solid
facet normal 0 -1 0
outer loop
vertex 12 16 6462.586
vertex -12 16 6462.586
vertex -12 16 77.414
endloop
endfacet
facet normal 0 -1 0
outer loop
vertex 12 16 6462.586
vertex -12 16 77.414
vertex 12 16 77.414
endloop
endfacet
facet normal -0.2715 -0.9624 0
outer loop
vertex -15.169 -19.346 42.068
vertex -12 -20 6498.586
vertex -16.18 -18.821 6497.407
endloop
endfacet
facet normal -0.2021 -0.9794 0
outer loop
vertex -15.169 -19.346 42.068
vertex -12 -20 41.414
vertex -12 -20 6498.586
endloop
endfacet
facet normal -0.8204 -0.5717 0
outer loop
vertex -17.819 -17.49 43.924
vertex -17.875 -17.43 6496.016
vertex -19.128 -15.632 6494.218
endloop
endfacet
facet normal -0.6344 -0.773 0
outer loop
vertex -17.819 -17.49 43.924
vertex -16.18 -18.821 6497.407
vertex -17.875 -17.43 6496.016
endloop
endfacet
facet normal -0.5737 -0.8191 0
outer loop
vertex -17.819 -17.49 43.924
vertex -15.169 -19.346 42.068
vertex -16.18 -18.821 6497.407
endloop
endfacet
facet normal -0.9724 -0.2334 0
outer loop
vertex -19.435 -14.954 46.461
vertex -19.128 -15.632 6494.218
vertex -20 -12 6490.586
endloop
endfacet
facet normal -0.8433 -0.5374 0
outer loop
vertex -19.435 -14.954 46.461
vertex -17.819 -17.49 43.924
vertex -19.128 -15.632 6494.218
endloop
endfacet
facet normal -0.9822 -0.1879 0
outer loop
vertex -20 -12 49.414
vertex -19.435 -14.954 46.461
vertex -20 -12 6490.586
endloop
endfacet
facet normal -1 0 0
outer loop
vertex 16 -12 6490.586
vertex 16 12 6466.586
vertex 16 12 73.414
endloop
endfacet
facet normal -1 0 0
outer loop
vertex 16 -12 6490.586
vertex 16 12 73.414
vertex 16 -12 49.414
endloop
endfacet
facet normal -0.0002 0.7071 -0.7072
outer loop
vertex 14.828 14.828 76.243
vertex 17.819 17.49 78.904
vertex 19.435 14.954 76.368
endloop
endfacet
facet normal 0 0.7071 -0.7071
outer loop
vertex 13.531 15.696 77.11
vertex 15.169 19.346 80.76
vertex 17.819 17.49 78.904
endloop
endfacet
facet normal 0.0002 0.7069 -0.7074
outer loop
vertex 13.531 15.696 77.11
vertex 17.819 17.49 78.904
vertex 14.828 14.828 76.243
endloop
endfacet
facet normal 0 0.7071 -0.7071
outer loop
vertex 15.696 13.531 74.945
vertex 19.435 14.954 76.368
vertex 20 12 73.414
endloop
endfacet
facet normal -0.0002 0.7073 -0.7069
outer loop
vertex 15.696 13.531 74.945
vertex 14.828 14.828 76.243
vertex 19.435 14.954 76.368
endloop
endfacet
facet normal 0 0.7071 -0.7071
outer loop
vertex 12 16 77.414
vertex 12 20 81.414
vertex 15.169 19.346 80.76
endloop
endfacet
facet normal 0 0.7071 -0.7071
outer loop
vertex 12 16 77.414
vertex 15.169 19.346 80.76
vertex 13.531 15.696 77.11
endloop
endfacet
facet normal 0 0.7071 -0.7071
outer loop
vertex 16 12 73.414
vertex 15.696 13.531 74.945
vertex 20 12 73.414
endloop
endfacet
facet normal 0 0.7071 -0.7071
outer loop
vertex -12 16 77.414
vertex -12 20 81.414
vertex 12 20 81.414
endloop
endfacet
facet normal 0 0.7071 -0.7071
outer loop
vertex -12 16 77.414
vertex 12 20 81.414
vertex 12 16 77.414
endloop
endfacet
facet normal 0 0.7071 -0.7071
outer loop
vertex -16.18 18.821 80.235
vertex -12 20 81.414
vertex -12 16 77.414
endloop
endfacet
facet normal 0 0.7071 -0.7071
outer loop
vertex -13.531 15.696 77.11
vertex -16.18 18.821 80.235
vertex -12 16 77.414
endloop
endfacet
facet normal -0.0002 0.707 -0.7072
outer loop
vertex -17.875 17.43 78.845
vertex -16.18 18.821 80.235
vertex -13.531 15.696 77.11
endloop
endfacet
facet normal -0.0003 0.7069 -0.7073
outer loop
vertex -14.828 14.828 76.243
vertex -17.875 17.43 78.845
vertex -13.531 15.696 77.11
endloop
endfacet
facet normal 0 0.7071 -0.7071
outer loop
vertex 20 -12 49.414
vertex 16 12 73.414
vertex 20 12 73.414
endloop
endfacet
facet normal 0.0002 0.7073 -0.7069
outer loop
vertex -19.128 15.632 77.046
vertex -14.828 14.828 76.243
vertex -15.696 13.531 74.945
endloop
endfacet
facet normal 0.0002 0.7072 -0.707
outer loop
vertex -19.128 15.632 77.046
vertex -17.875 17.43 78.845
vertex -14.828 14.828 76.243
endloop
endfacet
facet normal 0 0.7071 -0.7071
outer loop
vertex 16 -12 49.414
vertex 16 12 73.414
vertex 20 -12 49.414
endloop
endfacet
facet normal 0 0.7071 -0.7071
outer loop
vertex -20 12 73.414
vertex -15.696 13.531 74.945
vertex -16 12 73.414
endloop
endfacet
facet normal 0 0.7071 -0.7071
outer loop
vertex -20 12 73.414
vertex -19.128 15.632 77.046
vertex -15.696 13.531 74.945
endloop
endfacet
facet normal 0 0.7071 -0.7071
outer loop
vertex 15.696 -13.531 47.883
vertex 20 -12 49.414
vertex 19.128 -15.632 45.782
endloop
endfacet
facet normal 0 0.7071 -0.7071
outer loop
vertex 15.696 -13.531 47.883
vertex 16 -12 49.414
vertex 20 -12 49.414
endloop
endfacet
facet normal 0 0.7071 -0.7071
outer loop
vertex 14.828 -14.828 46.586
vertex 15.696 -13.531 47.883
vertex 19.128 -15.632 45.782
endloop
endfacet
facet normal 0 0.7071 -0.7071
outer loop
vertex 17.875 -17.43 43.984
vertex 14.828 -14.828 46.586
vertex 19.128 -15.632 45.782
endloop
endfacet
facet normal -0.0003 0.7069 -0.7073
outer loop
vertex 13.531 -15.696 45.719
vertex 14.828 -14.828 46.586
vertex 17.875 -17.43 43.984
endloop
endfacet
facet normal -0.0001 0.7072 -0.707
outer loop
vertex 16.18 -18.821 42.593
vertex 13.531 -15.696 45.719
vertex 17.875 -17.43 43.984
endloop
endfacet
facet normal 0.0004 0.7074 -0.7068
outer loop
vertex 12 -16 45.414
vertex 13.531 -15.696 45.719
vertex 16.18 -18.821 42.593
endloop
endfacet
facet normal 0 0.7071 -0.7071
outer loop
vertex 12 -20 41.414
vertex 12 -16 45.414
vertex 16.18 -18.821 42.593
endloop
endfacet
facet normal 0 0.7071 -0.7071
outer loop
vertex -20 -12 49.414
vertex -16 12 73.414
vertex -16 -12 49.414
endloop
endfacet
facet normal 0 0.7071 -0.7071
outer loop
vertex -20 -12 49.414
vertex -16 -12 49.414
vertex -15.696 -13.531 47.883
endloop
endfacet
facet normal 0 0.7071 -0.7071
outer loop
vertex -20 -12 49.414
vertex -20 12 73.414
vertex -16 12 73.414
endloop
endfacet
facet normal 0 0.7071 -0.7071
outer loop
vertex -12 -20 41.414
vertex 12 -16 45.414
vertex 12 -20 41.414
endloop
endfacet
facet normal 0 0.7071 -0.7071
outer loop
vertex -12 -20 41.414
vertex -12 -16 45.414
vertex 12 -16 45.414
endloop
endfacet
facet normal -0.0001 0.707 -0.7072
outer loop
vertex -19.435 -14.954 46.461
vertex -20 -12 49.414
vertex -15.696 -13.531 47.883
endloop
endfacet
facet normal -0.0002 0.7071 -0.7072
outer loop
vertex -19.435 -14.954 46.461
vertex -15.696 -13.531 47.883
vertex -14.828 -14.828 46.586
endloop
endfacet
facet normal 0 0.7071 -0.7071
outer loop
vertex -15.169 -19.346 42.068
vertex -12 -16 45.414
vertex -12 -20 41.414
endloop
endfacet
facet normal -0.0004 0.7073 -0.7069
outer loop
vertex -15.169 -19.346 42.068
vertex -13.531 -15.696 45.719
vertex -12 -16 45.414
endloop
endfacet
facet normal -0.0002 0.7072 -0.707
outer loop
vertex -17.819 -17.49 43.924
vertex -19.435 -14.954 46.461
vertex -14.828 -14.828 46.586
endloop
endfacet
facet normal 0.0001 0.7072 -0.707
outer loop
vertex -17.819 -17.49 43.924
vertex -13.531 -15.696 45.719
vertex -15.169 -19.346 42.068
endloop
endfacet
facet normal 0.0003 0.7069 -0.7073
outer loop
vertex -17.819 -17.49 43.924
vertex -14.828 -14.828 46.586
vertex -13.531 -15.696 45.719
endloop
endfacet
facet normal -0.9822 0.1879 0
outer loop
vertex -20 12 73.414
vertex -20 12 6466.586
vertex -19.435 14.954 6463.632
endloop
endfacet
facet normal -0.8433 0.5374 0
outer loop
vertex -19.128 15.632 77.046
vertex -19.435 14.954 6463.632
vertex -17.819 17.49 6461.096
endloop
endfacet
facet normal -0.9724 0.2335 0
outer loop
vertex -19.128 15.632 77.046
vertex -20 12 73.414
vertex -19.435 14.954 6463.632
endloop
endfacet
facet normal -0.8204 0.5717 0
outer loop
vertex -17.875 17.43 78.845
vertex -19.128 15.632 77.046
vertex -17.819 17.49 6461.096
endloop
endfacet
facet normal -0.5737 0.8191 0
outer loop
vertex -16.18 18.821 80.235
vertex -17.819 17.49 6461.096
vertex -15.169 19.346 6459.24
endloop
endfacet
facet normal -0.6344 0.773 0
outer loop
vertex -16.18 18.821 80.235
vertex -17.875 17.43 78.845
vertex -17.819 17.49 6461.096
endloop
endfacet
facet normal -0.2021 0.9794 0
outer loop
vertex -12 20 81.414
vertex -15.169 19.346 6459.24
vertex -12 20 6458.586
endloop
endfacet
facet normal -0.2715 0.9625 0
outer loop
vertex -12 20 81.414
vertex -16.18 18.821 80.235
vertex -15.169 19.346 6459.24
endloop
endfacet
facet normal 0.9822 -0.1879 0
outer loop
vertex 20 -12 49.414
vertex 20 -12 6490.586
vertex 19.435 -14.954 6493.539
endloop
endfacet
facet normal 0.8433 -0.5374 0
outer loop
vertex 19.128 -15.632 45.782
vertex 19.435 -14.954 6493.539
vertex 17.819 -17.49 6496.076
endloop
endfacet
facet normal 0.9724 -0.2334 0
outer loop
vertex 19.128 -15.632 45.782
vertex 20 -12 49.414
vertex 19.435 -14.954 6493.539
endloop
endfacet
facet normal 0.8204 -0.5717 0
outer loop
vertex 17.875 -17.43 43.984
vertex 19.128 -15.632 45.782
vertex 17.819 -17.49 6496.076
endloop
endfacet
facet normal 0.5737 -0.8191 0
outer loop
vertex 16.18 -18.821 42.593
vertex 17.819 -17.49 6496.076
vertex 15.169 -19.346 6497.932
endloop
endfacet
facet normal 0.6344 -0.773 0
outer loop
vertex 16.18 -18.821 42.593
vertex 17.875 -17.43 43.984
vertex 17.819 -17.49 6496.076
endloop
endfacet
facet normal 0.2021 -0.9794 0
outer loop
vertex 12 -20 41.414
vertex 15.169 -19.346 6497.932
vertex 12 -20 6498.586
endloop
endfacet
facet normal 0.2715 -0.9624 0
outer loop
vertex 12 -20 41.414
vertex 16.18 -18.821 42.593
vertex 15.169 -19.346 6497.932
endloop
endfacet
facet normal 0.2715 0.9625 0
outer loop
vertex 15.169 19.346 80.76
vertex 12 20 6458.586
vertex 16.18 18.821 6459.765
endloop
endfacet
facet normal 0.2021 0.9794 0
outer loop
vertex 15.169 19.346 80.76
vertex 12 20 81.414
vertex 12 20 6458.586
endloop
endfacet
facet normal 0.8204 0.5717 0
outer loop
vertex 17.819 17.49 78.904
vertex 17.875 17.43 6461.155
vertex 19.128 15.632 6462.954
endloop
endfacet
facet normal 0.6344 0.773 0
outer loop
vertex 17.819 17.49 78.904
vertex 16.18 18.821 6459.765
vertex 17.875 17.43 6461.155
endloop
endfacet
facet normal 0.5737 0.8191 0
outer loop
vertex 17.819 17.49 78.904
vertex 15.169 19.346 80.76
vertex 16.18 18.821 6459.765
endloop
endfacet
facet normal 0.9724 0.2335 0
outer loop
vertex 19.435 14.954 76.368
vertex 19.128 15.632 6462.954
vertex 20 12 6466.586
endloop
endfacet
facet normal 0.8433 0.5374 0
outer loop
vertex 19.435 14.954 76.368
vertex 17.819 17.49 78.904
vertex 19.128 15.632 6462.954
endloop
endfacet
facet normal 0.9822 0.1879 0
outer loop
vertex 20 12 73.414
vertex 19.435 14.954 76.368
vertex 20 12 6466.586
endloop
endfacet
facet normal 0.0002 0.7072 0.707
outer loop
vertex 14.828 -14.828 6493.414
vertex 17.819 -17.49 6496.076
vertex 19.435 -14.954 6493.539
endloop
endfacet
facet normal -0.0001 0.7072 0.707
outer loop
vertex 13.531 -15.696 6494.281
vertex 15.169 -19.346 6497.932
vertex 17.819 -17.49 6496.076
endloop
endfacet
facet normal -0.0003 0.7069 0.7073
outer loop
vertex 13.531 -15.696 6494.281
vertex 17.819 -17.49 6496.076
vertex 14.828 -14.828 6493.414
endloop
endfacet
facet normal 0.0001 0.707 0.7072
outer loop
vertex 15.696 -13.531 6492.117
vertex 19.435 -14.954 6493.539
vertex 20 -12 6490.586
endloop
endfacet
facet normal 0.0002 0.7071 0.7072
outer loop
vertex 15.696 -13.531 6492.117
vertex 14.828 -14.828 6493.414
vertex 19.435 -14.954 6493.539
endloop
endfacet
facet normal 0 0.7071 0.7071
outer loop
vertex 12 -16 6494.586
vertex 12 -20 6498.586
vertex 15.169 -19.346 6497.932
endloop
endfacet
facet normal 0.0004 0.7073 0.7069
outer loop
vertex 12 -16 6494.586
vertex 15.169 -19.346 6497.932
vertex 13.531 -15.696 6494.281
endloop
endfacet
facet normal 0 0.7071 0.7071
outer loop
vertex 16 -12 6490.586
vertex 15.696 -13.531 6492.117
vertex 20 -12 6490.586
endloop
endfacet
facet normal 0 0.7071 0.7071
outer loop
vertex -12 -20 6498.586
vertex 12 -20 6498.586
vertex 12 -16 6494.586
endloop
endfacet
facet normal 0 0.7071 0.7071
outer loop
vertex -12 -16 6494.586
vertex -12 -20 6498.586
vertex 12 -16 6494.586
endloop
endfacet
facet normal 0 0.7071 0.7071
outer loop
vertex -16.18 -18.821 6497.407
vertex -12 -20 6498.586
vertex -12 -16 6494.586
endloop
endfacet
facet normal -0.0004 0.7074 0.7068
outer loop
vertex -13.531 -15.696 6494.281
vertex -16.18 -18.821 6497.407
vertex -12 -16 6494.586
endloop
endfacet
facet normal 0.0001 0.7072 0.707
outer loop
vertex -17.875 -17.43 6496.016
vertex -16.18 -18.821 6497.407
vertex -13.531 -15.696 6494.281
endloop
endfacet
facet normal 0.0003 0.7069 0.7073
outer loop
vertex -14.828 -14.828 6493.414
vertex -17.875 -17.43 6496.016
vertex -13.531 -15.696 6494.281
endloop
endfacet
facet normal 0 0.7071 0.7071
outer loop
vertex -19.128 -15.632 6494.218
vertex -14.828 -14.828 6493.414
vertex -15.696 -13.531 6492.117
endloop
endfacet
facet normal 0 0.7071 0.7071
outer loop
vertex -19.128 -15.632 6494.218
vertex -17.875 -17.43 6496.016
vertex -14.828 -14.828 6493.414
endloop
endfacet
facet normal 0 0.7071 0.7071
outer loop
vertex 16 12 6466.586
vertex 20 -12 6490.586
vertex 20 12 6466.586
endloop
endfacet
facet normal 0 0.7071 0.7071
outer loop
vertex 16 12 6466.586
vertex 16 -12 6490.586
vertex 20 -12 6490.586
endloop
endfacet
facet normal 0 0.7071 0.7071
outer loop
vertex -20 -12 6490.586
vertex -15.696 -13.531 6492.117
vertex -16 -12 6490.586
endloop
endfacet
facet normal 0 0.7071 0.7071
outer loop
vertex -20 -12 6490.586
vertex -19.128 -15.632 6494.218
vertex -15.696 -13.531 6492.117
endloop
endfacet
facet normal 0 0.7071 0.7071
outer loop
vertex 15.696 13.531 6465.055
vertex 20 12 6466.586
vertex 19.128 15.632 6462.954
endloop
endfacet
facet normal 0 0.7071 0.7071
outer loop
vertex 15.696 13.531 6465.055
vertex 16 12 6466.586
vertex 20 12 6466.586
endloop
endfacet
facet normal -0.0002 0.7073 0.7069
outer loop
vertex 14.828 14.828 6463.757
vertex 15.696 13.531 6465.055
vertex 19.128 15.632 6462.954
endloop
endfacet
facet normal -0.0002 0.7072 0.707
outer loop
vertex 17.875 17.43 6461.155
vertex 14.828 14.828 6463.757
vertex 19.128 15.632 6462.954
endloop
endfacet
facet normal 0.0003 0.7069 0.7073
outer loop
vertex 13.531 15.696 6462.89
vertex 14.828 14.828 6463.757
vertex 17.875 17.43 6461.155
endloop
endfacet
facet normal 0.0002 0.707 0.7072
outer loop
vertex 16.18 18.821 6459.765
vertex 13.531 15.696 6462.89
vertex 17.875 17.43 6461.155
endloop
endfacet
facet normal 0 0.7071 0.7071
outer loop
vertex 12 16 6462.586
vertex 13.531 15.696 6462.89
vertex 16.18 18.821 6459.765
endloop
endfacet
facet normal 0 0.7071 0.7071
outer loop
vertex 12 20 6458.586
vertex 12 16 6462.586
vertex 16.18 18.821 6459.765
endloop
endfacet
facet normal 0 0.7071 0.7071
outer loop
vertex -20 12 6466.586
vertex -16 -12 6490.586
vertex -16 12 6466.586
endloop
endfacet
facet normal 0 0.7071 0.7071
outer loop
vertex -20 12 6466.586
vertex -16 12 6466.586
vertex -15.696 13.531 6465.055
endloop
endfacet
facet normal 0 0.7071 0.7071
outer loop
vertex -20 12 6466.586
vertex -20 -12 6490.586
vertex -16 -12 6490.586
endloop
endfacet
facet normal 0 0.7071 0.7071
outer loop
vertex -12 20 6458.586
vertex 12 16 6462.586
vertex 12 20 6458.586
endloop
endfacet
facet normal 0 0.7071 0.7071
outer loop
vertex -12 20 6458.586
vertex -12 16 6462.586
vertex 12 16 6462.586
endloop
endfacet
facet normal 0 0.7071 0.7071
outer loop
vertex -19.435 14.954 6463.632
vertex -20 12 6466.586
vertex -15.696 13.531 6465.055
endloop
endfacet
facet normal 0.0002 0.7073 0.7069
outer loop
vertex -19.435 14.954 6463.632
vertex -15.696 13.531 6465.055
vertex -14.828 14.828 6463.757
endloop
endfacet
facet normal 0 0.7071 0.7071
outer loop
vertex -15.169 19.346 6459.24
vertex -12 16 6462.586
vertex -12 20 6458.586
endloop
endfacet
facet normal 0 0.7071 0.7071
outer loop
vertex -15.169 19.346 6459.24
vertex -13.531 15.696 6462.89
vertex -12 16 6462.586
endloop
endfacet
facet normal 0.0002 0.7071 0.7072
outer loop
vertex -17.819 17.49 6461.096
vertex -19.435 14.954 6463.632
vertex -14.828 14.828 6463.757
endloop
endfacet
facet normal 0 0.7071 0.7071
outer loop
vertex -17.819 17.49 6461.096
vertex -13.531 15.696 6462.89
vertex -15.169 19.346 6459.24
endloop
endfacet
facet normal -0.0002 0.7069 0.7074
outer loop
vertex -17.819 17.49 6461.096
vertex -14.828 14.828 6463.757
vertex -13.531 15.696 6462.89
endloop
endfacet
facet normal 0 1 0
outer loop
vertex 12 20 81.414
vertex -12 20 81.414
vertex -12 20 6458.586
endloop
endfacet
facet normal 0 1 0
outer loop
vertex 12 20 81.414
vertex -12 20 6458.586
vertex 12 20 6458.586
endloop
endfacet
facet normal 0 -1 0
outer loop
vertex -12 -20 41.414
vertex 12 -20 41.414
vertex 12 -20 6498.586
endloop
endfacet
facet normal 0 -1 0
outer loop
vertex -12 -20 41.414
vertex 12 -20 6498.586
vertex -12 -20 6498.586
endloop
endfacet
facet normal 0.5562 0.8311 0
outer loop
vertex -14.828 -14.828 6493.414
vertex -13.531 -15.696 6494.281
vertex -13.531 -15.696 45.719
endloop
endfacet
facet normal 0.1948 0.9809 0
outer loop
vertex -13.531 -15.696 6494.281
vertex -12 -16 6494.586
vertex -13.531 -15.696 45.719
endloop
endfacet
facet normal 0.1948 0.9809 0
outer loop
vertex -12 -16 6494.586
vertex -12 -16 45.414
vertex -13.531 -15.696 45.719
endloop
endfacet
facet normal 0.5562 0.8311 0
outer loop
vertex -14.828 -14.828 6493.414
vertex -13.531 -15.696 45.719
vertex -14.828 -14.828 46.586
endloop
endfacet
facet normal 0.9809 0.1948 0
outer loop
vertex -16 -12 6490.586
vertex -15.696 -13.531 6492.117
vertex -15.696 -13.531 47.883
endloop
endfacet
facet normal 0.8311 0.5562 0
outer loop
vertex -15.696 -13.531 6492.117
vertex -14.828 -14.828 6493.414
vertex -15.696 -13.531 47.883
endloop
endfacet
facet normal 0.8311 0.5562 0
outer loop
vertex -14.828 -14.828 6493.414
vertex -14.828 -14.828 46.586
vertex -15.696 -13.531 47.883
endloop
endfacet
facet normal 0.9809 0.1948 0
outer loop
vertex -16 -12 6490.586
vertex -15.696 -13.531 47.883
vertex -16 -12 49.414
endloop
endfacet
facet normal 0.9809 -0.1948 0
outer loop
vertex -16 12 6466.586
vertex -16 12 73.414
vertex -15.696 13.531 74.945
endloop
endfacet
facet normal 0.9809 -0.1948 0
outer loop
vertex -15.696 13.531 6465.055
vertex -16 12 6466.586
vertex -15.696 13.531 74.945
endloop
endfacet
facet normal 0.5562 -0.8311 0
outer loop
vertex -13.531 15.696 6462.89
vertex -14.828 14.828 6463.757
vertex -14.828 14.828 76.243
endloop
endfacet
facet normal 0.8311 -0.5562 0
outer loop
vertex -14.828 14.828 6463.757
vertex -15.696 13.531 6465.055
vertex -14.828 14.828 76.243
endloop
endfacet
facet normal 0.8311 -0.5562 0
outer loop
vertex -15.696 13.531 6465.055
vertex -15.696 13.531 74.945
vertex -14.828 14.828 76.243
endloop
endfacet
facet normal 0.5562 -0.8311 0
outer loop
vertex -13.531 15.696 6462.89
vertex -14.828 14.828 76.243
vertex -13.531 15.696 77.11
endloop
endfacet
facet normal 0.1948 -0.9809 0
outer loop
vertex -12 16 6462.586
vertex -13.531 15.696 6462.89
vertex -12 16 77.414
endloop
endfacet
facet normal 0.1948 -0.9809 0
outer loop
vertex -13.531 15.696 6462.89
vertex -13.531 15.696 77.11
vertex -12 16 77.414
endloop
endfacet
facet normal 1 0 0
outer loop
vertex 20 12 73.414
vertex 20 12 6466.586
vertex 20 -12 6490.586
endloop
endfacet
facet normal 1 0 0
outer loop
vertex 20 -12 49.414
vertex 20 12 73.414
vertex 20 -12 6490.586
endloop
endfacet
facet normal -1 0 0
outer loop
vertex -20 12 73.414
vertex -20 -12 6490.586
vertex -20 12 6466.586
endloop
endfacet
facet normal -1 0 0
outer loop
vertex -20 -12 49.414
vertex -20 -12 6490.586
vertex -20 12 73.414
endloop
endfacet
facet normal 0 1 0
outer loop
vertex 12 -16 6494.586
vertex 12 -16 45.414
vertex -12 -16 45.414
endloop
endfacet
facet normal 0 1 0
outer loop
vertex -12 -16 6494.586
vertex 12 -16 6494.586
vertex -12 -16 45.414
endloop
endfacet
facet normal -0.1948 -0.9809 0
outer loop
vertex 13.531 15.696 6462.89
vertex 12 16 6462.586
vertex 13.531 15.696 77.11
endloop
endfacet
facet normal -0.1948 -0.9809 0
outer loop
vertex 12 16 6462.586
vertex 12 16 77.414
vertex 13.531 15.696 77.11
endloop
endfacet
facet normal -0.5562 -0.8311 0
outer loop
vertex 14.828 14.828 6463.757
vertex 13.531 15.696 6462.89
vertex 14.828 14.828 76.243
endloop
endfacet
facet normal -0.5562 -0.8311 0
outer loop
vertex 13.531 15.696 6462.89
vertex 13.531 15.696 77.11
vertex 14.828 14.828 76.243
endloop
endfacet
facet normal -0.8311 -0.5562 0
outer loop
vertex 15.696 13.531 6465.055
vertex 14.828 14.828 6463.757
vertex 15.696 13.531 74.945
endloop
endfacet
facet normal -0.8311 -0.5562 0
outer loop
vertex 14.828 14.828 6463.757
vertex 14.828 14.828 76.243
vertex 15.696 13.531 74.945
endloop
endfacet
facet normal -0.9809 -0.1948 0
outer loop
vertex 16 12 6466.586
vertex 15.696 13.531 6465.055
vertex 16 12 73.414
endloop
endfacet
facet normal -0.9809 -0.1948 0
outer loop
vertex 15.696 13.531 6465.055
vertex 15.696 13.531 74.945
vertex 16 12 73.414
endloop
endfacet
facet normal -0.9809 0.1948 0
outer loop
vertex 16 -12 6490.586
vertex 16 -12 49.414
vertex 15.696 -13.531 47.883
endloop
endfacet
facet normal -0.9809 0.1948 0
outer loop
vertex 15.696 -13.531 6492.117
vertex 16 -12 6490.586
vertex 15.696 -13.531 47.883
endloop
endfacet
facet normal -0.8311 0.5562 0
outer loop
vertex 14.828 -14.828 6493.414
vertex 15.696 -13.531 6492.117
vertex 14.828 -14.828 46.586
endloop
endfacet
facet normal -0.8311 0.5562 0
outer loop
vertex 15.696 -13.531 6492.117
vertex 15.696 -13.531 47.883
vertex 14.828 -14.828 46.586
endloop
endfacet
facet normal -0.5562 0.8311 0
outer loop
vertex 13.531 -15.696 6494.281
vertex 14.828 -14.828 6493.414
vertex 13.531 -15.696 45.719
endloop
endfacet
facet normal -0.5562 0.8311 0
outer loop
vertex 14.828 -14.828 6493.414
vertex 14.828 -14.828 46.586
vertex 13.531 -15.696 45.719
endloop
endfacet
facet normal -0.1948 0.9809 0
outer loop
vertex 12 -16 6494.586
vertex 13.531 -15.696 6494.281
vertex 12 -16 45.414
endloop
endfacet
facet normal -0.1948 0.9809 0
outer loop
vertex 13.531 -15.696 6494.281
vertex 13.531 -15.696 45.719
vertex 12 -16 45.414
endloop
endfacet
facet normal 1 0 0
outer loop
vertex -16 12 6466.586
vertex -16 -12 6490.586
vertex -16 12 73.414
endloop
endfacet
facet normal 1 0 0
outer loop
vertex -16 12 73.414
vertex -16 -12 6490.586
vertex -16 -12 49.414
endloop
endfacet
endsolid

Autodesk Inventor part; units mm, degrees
ref_plane "Start Plane" through (0, 0, 41.4142) normal (0, 0, 1) x (1, 0, 0)
ref_plane "End Plane" through (0, 0, 6498.5858) normal (0, 0, 1) x (1, 0, 0)
sketch "Sketch" plane through (0, 0, 0) normal (0, 0, 1) x (1, 0, 0)
  line L0 (-20, -12) -> (-20, 12)
  line L1 (-12, 20) -> (12, 20)
  line L2 (20, 12) -> (20, -12)
  line L3 (12, -20) -> (-12, -20)
  arc A0 (-20, -12) -> (-12, -20) centre (-12, -12) ccw
  arc A1 (20, 12) -> (12, 20) centre (12, 12) ccw
  arc A2 (-12, 20) -> (-20, 12) centre (-12, 12) ccw
  arc A3 (12, -20) -> (20, -12) centre (12, -12) ccw
  arc A4 (-12, 16) -> (-16, 12) centre (-12, 12) ccw
  line L4 (-12, 16) -> (12, 16)
  arc A5 (16, 12) -> (12, 16) centre (12, 12) ccw
  line L5 (16, 12) -> (16, -12)
  arc A6 (12, -16) -> (16, -12) centre (12, -12) ccw
  line L6 (12, -16) -> (-12, -16)
  arc A7 (-16, -12) -> (-12, -16) centre (-12, -12) ccw
  line L7 (-16, -12) -> (-16, 12)
  line L8 (0, 30.3196) -> (0, -30.3196) construction
  line L9 (-30.3196, 0) -> (30.3196, 0) construction
  dimension "d7" = 8
  dimension "d9" = 40
  dimension "d11" = 40
  dimension "d12" = 4
  dimension "d15" = 20
  dimension "d16" = 20
extrude "Body" add sketch "Sketch" along normal up to surface (6457.1716 mm away) from surface at 41.4142
sketch "Sketch3" plane through (0, 0, 0) normal (0, 0, 1) x (1, 0, 0)
  line L0 (0, 0) -> (10, 0)
ref_plane "Work Plane3" through (0, 0, 0) normal (0, -1, 0) x (1, 0, 0)
ref_plane "Work Plane4" through (0, -20.7071, 6499.2929) normal (0, 0.7071, 0.7071) x (1, 0, 0)
split "Split1" plane through (0, -20.7071, 6499.2929) removes the side toward (0, 0.7071, 0.7071)
ref_plane "Work Plane5" through (0, -20.7071, 40.7071) normal (0, 0.7071, -0.7071) x (1, 0, 0)
split "Split2" plane through (0, -20.7071, 40.7071) removes the side toward (0, 0.7071, -0.7071)
sketch "Sketch4" plane through (0, 0, 0) normal (0, -1, 0) x (1, 0, 0)
  line L0 (-2, 41.4142) -> (12, 41.4142) projected
  line L1 (-2, 6498.5858) -> (12, 6498.5858) projected
  dimension "d18" = 6457.1716
equation "\"d7\" = G_IR"
equation "\"d9\" = G_W"
equation "\"d11\" = G_H"
equation "\"d12\" = G_T"
equation "\"d15\" = 0.5 * d9"
equation "\"d16\" = 0.5 * d11"
equation "\"d3\" = G_L"
equation "\"G_W\" = 40"
equation "\"G_H\" = 40"
equation "\"G_T\" = 4"
equation "\"G_IR\" = 8"
equation "\"G_L\" = d18"
equation "\"G_OFFSET_START\" = -41.41421"
equation "\"G_OFFSET_END\" = 18.58579"
equation "\"d13\" = -G_OFFSET_START"
equation "\"d14\" = G_OFFSET_END + B_L"
equation "\"B_L\" = 6480"
properties part number "ISO 10799-2 - 40x40x4 - 6457,17" material "Steel, Mild"
